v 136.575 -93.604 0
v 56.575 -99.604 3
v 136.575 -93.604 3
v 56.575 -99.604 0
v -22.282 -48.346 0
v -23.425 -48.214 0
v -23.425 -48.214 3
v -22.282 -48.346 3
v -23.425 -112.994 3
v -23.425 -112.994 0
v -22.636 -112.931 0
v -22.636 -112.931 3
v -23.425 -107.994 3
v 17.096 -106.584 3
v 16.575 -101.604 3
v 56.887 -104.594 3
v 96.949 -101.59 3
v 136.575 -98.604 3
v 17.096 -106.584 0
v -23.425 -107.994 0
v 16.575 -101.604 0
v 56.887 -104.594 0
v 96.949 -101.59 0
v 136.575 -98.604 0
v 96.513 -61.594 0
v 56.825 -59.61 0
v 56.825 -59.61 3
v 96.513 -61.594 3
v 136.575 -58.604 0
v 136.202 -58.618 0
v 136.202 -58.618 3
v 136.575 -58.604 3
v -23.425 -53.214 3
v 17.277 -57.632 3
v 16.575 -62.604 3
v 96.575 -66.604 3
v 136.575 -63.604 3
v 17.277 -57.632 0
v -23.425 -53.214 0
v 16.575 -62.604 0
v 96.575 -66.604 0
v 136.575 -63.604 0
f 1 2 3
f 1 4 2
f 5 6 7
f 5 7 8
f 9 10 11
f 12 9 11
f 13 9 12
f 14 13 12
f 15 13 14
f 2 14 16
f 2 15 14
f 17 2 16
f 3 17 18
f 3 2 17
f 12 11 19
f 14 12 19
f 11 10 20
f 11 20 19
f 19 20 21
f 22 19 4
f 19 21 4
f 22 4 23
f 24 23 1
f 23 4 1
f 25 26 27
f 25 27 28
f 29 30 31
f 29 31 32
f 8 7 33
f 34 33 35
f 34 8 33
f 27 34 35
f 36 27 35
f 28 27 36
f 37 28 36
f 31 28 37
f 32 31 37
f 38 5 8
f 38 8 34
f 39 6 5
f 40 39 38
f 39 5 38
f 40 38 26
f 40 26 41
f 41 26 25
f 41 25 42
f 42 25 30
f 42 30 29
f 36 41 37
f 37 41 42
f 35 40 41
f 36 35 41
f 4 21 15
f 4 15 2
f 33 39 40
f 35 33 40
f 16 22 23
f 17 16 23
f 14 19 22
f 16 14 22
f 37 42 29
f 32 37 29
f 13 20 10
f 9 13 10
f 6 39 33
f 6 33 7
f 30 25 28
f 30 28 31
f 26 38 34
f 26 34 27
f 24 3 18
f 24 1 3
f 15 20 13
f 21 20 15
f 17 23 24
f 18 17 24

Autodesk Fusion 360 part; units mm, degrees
sketch "Sketch1" plane through (0, 0, 0) normal (0, 0, 1) x (1, 0, 0)
  line L0 (-23.4246, -53.2136) -> (16.5754, -62.6036)
  line L1 (16.5754, -62.6036) -> (56.5754, -64.6036)
  line L2 (56.5754, -64.6036) -> (96.5754, -66.6036)
  line L3 (96.5754, -66.6036) -> (136.5754, -63.6036)
  line L4 (-23.4246, -107.9936) -> (16.5754, -101.6036)
  line L5 (16.5754, -101.6036) -> (56.5754, -99.6036)
  line L6 (56.5754, -99.6036) -> (96.5754, -96.6036)
  line L7 (96.5754, -96.6036) -> (136.5754, -93.6036)
  line L8 (-22.2819, -48.3459) -> (17.2773, -57.6324)
  line L9 (17.2773, -57.6324) -> (56.8251, -59.6098)
  line L10 (56.8251, -59.6098) -> (96.5131, -61.5942)
  line L11 (96.5131, -61.5942) -> (136.2015, -58.6176)
  line L12 (-22.6358, -112.931) -> (17.0962, -106.5838)
  line L13 (17.0962, -106.5838) -> (56.8873, -104.5942)
  line L14 (56.8873, -104.5942) -> (96.9494, -101.5896)
  line L15 (-23.4246, -53.2136) -> (-23.4246, -48.2136)
  line L16 (-23.4246, -107.9936) -> (-23.4246, -112.9936)
  line L17 (136.5754, -93.6036) -> (136.5754, -98.6036)
  line L18 (136.5754, -63.6036) -> (136.5754, -58.6036)
  line L19 (-23.4246, -48.2136) -> (-22.2819, -48.3459)
  line L20 (-23.4246, -112.9936) -> (-22.6358, -112.931)
  line L21 (96.9494, -101.5896) -> (136.5754, -98.6036)
  line L22 (136.2015, -58.6176) -> (136.5754, -58.6036)
  dimension "d1" = 54.78
  dimension "d21" = -5
  dimension "d23" = 5
  dimension "d24" = 5
  dimension "d25" = 5
  dimension "d26" = 5
extrude "Extrude1" add sketch "Sketch1" along normal blind 3 makes body 1 at (96.7001, -98.2656, 0) makes body 2 at (43.4761, -62.2799, 0)
